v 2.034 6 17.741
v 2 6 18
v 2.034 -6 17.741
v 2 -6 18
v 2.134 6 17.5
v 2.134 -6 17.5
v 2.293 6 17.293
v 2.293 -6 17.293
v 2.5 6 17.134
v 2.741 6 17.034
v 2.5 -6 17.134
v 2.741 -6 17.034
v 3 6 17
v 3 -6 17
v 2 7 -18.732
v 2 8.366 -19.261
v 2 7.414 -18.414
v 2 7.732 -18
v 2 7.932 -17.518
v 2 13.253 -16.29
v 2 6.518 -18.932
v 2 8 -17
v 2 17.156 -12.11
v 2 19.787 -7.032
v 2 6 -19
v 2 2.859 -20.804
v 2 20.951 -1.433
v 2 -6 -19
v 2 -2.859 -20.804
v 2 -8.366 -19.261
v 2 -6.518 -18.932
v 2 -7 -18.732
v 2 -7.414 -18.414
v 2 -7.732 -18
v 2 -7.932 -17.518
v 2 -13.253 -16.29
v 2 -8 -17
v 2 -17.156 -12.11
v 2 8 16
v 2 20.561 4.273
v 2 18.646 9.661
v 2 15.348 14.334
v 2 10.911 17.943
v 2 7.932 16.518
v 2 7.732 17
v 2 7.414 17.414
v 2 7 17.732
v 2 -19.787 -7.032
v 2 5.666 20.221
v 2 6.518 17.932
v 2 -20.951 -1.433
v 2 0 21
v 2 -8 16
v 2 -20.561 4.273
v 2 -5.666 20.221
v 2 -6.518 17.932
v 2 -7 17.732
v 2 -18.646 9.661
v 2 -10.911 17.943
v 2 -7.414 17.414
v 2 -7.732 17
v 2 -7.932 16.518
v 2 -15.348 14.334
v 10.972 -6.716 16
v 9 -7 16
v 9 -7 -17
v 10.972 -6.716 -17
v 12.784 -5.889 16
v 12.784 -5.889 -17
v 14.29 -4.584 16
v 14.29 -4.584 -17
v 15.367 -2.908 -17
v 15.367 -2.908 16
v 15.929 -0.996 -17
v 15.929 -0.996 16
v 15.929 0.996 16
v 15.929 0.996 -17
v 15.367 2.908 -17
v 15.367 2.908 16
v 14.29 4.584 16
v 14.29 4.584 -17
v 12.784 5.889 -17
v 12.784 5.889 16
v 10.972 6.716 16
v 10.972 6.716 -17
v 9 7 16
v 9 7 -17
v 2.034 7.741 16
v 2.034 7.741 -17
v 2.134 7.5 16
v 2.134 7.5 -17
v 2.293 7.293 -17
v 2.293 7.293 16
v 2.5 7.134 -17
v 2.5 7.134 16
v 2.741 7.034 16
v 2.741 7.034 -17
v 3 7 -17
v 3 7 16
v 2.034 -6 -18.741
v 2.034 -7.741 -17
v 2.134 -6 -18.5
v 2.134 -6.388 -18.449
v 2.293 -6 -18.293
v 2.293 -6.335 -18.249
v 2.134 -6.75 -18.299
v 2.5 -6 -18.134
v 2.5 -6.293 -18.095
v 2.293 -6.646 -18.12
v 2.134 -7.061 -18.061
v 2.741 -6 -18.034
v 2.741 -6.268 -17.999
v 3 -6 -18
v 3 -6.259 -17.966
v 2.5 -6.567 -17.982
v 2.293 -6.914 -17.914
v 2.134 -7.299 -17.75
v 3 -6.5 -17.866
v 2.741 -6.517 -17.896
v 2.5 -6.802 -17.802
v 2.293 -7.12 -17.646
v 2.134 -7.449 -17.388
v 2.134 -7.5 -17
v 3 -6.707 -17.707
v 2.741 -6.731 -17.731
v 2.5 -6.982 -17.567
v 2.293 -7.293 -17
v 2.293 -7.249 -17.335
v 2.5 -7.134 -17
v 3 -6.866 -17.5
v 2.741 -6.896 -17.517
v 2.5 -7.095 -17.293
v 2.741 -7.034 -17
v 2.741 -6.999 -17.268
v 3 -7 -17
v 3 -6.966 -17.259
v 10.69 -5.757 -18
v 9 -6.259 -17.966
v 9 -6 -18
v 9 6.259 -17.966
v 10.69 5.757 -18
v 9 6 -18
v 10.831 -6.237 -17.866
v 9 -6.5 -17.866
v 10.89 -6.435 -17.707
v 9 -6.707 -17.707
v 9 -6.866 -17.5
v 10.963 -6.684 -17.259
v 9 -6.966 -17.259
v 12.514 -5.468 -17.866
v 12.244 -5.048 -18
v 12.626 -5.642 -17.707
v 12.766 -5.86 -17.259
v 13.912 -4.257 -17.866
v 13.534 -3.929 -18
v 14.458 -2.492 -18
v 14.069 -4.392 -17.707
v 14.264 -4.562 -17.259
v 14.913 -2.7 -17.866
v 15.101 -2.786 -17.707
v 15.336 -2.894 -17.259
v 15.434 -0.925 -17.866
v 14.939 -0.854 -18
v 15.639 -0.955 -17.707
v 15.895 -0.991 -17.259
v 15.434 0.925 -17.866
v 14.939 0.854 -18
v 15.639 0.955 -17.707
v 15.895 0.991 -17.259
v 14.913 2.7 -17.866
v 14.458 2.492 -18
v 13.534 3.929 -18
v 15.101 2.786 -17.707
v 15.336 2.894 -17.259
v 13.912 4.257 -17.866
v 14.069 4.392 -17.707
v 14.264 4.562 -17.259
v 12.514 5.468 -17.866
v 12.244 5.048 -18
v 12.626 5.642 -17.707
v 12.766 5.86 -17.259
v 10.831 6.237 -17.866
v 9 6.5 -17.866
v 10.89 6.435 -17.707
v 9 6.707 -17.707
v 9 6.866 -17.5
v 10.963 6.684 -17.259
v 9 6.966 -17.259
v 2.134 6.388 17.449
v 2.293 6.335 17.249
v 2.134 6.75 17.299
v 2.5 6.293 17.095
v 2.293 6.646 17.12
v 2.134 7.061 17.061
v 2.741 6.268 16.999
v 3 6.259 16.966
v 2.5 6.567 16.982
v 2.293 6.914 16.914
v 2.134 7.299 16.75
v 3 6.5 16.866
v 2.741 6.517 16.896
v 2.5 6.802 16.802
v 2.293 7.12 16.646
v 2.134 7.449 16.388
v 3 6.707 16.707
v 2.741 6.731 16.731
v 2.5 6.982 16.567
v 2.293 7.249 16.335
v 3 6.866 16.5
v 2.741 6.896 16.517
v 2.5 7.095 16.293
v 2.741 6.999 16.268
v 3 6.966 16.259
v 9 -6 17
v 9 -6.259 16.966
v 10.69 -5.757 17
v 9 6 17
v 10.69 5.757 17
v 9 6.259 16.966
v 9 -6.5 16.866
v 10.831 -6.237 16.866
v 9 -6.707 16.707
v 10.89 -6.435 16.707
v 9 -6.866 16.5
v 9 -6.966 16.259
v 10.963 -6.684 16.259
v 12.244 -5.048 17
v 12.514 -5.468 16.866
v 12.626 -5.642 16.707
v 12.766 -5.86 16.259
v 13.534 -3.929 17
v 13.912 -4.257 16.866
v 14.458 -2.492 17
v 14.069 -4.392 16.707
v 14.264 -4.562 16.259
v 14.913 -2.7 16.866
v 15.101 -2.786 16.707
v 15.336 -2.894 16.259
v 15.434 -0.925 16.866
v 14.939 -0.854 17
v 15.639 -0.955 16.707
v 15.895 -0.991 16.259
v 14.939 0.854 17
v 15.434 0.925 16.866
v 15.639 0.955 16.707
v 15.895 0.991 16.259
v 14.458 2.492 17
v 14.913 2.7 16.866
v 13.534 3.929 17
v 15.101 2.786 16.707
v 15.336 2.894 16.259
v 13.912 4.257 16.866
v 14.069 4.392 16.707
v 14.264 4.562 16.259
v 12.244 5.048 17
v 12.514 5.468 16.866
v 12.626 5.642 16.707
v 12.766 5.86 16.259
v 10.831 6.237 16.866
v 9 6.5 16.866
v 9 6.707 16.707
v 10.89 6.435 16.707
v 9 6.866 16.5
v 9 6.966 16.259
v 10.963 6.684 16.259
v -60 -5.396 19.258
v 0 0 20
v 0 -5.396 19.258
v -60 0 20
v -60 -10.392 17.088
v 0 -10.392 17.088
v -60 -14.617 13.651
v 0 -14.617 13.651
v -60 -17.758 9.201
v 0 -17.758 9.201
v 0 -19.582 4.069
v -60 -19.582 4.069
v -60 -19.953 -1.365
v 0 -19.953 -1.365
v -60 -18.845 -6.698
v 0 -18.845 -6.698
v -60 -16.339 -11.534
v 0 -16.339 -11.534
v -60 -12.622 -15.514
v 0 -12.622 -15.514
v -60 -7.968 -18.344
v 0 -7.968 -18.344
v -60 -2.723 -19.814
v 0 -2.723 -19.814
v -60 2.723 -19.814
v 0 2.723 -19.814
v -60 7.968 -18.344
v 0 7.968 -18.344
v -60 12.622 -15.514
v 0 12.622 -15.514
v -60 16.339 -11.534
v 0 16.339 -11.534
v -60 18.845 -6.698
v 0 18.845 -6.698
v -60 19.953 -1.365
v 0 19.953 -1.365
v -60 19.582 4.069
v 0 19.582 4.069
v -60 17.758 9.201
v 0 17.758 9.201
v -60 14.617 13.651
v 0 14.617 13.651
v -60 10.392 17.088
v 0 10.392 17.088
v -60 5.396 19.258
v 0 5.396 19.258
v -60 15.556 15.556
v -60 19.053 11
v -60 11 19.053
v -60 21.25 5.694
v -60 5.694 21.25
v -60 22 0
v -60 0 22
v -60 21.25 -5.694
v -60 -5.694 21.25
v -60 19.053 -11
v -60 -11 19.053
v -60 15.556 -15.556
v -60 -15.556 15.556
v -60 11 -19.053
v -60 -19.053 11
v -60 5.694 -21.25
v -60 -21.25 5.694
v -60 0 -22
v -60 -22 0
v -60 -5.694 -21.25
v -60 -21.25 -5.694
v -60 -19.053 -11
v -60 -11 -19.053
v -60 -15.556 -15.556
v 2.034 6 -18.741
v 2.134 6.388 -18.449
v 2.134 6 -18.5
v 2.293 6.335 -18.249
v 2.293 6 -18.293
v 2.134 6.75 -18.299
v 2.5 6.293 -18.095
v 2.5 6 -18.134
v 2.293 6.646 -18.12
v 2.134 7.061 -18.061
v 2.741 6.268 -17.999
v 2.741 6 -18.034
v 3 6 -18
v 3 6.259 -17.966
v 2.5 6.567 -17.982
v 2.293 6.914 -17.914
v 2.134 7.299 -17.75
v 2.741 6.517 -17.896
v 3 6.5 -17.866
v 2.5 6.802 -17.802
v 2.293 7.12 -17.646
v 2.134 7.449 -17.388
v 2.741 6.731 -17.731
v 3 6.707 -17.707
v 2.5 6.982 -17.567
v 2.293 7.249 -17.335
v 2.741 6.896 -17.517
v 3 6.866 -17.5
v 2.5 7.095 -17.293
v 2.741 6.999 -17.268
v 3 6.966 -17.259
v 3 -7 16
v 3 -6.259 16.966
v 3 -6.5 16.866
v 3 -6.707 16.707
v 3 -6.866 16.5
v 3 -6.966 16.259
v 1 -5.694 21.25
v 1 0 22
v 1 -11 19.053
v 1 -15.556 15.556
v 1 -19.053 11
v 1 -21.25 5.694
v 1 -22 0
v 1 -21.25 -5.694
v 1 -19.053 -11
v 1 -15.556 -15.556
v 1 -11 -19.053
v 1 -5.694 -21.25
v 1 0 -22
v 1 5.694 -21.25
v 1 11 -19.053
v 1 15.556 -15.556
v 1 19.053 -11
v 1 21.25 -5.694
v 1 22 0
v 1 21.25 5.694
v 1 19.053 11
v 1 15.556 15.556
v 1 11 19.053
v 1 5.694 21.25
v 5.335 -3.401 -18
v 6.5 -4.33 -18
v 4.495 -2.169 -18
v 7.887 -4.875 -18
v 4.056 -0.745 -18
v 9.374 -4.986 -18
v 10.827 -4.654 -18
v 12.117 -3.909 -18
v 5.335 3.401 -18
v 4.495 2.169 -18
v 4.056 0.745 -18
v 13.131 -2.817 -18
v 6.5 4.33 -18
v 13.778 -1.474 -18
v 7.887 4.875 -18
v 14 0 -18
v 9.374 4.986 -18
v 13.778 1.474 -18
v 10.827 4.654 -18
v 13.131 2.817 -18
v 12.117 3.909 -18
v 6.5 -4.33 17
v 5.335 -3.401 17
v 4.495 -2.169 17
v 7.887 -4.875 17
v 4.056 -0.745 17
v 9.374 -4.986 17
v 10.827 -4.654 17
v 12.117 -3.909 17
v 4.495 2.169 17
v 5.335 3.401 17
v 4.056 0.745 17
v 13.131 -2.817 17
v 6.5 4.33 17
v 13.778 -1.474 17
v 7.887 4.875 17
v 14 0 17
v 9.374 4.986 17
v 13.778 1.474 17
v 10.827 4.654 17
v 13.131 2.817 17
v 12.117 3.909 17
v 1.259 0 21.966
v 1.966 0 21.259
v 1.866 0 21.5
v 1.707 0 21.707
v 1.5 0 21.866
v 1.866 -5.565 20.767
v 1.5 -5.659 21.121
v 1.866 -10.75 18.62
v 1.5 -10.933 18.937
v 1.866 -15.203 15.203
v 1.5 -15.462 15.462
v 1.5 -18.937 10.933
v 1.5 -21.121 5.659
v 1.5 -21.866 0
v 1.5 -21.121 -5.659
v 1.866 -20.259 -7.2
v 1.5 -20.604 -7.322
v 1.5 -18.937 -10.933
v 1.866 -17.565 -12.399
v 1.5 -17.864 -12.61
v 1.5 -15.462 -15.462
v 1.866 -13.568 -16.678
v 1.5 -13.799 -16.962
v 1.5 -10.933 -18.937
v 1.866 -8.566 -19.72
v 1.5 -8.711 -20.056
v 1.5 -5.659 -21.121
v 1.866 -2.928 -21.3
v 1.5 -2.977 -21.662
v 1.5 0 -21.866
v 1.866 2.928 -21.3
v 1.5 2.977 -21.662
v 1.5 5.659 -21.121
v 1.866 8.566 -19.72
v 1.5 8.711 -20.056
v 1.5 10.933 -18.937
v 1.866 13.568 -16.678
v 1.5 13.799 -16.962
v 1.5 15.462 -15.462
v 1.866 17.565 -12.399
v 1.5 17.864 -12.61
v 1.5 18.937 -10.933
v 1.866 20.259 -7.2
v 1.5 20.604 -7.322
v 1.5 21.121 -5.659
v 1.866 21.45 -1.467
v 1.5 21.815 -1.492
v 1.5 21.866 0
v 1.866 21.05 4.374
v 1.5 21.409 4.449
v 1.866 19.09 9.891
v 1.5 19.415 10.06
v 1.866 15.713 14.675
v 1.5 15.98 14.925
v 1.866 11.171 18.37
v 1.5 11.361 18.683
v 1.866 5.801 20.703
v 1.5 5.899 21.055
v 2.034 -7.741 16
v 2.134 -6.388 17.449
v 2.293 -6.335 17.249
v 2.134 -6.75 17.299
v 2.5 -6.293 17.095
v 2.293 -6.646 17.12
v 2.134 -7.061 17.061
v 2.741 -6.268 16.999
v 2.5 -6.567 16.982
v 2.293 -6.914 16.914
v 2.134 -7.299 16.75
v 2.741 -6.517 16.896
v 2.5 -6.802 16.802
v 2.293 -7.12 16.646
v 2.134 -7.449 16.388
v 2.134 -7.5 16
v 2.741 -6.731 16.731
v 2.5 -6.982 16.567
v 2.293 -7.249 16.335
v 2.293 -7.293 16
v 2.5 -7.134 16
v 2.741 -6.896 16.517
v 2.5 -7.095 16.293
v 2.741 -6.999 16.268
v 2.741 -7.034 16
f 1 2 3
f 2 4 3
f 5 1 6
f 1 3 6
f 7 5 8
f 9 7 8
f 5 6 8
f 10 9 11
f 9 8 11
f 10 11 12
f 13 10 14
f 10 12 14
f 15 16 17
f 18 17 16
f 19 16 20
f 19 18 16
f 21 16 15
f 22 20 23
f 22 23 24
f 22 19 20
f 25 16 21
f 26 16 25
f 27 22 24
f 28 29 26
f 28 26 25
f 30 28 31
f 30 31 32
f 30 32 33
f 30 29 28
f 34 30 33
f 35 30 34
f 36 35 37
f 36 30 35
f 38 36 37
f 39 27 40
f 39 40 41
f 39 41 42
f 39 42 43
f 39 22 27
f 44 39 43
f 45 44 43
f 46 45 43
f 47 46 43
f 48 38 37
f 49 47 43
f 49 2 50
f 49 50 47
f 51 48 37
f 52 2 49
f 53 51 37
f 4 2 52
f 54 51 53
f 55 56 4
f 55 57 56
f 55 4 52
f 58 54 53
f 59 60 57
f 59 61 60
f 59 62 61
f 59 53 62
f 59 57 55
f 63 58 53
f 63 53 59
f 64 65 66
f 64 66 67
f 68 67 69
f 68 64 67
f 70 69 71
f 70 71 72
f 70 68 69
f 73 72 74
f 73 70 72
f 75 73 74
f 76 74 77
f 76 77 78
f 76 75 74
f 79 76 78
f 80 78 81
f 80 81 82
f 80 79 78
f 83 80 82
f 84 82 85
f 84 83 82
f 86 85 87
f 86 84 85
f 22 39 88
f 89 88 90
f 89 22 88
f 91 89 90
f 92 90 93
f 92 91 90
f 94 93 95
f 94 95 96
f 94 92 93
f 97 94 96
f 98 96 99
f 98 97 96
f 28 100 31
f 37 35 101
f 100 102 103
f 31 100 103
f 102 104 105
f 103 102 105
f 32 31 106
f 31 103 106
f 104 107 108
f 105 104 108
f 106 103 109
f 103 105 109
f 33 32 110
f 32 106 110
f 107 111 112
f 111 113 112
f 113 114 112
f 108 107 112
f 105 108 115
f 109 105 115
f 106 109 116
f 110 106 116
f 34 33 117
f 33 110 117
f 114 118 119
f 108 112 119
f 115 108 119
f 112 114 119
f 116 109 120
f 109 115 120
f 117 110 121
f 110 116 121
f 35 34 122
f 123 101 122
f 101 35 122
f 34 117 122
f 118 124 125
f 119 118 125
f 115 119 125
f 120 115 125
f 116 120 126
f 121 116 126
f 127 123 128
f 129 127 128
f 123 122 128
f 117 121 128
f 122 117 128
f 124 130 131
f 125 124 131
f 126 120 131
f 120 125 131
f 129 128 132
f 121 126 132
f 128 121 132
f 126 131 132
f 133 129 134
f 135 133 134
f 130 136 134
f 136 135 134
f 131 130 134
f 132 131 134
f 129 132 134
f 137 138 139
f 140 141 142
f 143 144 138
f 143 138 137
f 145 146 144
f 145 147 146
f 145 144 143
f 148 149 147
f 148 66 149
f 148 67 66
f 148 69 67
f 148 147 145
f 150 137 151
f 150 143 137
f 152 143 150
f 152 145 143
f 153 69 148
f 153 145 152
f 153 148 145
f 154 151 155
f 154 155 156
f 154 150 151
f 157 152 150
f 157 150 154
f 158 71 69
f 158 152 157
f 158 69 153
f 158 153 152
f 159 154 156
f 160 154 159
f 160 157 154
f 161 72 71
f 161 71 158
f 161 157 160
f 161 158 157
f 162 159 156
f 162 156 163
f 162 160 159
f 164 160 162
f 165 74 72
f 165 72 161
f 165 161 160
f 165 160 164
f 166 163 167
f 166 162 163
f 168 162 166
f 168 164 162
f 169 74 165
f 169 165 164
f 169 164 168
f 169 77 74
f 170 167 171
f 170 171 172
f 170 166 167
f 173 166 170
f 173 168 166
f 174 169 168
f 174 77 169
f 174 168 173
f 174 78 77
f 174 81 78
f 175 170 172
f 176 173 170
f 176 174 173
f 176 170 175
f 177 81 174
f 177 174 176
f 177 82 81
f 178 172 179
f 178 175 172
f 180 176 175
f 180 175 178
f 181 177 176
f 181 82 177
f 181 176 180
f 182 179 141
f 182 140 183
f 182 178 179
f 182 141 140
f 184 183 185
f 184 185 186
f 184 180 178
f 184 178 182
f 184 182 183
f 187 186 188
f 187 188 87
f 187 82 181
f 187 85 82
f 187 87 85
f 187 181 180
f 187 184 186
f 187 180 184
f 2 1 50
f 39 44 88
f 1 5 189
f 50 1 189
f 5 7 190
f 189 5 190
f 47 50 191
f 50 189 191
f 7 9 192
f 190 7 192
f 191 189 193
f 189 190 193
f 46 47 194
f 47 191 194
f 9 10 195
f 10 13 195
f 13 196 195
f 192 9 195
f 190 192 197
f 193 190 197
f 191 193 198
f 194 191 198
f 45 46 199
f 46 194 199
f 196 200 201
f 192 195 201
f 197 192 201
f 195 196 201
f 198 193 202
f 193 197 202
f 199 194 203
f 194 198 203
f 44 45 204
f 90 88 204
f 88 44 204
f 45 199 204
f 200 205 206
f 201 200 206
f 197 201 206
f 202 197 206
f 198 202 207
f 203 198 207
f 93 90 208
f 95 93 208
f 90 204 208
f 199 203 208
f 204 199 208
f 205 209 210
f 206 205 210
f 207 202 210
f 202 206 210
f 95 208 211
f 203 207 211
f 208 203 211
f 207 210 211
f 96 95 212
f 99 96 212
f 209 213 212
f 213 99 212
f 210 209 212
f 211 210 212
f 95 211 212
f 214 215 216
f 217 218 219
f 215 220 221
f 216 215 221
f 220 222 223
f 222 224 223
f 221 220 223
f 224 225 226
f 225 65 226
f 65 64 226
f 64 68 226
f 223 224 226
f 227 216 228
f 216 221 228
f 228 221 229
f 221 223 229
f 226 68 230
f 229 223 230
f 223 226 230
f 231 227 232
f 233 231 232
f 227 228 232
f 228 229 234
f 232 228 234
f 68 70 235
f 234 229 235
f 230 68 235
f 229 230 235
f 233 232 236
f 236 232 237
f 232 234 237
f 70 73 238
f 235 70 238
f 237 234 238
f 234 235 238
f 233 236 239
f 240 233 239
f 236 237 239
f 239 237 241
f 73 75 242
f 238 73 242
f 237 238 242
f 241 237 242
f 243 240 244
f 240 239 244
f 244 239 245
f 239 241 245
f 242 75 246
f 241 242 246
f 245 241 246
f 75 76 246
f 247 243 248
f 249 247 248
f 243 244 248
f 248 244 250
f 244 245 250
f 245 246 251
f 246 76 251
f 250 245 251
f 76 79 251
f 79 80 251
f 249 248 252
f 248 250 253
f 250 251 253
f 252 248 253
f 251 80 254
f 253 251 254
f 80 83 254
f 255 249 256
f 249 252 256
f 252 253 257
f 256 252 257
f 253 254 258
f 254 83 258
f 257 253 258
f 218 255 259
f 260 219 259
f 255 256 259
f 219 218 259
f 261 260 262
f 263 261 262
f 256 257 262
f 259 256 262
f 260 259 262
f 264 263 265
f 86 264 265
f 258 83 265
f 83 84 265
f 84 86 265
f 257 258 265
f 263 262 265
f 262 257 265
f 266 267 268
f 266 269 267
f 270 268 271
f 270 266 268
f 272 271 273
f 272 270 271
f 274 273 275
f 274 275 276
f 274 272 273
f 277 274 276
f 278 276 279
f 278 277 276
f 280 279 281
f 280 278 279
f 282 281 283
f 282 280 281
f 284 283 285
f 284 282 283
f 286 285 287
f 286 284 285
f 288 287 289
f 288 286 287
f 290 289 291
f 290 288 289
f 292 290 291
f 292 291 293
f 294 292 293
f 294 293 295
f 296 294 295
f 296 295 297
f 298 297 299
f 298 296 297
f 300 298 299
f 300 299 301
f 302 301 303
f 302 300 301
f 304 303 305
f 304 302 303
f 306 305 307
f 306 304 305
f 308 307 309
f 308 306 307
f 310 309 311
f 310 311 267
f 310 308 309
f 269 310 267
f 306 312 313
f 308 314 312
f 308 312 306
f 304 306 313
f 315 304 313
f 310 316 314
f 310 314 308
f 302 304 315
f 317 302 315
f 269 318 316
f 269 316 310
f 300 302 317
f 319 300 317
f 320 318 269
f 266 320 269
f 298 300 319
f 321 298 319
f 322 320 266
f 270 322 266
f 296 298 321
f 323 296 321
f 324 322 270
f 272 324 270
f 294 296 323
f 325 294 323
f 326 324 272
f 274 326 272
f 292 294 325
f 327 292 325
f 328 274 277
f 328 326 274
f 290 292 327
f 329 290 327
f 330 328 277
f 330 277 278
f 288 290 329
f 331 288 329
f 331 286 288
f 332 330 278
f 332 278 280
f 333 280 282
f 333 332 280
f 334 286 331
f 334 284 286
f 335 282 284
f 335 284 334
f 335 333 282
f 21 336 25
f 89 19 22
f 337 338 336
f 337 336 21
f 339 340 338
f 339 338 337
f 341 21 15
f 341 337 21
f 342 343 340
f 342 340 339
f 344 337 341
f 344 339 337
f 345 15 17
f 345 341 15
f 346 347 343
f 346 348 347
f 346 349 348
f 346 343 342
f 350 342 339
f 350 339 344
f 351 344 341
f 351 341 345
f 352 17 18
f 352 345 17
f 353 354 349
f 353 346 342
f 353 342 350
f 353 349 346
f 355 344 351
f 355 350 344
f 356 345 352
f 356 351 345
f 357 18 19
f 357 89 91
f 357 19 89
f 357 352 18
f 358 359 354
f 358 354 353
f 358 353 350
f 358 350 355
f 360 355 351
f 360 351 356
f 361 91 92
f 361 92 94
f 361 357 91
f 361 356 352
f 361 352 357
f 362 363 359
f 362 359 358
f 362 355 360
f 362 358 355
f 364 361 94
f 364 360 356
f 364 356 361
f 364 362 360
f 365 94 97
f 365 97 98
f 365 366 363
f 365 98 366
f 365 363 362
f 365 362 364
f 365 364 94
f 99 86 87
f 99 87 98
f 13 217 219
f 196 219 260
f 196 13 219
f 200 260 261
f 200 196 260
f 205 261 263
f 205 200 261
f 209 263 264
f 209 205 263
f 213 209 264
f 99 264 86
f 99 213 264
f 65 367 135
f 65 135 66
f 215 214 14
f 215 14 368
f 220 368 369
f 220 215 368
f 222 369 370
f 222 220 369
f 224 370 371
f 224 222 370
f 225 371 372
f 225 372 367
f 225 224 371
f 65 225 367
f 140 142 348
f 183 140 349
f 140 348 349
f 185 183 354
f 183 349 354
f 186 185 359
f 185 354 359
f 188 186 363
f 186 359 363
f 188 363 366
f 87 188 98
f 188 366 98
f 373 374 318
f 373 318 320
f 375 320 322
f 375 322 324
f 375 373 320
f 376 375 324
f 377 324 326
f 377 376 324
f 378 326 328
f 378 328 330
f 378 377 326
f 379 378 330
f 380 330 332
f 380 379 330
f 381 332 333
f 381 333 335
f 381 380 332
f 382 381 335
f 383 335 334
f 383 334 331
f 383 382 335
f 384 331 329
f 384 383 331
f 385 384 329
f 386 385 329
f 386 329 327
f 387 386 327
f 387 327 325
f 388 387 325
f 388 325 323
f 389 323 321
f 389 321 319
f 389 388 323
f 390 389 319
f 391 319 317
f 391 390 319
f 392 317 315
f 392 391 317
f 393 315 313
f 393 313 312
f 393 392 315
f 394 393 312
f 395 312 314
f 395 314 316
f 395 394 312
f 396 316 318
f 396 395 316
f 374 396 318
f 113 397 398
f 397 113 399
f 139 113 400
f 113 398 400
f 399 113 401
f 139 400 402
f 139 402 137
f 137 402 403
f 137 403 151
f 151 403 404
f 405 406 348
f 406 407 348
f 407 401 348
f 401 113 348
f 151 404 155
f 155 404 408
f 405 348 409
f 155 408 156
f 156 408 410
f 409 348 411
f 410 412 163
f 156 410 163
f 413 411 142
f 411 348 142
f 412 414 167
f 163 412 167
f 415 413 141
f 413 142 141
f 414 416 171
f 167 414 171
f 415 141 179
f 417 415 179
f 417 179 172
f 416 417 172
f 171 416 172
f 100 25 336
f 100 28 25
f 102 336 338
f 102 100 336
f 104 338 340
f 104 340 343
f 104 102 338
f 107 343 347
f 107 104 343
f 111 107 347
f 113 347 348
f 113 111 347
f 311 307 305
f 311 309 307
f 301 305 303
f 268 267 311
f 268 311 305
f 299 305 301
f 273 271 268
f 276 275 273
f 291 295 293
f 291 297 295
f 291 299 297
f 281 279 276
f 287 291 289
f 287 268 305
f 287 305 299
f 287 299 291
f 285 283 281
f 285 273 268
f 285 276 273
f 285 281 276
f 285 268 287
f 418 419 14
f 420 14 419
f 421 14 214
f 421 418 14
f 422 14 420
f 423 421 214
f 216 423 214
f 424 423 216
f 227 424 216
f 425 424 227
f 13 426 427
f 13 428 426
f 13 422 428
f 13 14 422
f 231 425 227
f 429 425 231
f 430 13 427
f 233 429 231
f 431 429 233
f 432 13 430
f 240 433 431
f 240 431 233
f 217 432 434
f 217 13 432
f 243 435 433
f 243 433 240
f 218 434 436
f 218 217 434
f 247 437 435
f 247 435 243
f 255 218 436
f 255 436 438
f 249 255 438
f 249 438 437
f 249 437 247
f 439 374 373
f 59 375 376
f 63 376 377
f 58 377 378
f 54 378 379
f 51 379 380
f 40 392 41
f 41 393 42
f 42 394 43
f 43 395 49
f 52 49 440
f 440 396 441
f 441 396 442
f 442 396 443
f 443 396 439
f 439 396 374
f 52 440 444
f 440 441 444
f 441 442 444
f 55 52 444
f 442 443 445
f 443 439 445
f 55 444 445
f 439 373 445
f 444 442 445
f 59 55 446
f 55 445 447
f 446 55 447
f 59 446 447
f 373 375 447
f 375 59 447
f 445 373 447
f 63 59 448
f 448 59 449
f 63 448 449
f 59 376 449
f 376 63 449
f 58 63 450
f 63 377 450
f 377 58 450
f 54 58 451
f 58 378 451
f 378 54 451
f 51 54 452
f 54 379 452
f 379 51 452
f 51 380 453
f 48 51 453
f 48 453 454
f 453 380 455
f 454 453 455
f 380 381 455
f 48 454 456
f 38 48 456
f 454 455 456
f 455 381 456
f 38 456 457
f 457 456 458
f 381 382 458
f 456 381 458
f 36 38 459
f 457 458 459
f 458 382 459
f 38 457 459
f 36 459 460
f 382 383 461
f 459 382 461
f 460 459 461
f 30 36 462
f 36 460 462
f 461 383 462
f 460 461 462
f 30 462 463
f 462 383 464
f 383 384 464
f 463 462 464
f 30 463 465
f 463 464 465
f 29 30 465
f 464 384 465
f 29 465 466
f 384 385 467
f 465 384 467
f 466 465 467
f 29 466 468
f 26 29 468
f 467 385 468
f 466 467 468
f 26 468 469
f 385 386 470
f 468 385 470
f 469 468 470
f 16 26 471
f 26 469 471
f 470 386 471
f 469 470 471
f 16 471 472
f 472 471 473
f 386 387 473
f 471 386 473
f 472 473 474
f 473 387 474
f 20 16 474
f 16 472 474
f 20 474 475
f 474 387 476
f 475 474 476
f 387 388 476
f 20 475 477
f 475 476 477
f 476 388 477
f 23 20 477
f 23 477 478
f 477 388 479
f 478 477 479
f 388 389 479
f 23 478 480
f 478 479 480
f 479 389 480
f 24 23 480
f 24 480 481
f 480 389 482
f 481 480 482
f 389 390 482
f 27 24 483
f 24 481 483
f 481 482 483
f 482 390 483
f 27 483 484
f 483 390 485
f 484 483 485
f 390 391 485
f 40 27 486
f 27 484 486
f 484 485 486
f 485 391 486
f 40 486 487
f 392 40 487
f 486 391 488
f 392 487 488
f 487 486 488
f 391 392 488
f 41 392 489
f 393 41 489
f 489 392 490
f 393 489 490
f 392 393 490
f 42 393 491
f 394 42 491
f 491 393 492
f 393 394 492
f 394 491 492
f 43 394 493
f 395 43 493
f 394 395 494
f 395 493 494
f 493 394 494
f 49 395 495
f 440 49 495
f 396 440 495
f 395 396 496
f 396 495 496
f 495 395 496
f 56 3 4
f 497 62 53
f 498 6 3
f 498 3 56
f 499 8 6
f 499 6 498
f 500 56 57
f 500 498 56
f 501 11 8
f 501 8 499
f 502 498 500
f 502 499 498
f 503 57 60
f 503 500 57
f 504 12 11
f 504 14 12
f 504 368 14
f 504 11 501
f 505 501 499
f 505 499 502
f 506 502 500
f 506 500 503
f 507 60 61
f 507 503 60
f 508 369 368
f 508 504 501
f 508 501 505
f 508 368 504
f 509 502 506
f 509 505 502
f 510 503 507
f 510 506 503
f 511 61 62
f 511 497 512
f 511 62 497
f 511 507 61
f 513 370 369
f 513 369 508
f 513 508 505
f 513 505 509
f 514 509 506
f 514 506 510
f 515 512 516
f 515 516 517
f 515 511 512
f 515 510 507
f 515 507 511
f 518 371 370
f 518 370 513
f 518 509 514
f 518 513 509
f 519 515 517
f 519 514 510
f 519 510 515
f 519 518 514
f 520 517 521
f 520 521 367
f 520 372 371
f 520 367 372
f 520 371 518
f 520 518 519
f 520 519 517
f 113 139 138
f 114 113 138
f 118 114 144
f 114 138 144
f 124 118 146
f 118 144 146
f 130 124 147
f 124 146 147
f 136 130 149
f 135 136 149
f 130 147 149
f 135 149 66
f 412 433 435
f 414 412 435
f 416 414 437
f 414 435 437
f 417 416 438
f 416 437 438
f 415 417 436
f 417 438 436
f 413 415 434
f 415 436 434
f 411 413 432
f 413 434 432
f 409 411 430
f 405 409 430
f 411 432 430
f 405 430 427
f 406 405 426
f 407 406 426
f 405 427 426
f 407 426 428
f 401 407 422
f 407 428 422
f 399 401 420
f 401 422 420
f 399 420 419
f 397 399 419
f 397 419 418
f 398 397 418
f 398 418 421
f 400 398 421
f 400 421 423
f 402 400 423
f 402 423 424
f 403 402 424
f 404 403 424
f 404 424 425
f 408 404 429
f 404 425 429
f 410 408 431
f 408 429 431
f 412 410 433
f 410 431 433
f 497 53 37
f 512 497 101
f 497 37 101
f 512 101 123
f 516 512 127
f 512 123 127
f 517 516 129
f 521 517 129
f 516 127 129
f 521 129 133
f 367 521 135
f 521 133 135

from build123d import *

# Parameters (mm, degrees)
SKETCH3_R           = 5
BOSS_EXTRUDE2_DEPTH = 35
FILLET2_R           = 1
FILLET3_R           = 1


with BuildPart() as part:
    # Sketch1 → Revolve1 (revolve)
    with BuildSketch(Plane.XY, mode=Mode.PRIVATE) as revolve1_sk:
        Polygon((2, 22), (2, 0), (0, 0), (0, 20), (-60, 20), (-60, 22), align=None)
    revolve(revolve1_sk.sketch.rotate(Axis((-25.911369332, 0, 0), (1, 0, 0)), 90), axis=Axis((-25.911369332, 0, 0), (1, 0, 0)))

    # Sketch3 → Boss-Extrude2 (add)
    with BuildSketch(Plane.XY.offset(17)):
        with BuildLine():
            Line((9, 7), (2, 7))
            Line((2, 7), (2, -7))
            Line((2, -7), (9, -7))
            ThreePointArc((9, -7), (16, 0), (9, 7))
        make_face()
        with Locations((9, 0)):
            Circle(SKETCH3_R, mode=Mode.SUBTRACT)
    extrude(amount=-BOSS_EXTRUDE2_DEPTH)

    # Fillet2
    fillet2_edges = [part.edges().sort_by_distance(p)[0] for p in [
        (2, 0, -22),
    ]]
    fillet(fillet2_edges, radius=FILLET2_R)

    # Fillet3
    fillet3_edges = [part.edges().sort_by_distance(p)[0] for p in [
        (16, 0, -18),
        (5.5, -7, -18),
        (2, 0, -18),
        (2, -7, -0.5),
        (5.5, 7, -18),
        (2, 7, -0.5),
        (16, 0, 17),
        (5.5, 7, 17),
        (2, 0, 17),
        (5.5, -7, 17),
    ]]
    fillet(fillet3_edges, radius=FILLET3_R)


solid = part.part
